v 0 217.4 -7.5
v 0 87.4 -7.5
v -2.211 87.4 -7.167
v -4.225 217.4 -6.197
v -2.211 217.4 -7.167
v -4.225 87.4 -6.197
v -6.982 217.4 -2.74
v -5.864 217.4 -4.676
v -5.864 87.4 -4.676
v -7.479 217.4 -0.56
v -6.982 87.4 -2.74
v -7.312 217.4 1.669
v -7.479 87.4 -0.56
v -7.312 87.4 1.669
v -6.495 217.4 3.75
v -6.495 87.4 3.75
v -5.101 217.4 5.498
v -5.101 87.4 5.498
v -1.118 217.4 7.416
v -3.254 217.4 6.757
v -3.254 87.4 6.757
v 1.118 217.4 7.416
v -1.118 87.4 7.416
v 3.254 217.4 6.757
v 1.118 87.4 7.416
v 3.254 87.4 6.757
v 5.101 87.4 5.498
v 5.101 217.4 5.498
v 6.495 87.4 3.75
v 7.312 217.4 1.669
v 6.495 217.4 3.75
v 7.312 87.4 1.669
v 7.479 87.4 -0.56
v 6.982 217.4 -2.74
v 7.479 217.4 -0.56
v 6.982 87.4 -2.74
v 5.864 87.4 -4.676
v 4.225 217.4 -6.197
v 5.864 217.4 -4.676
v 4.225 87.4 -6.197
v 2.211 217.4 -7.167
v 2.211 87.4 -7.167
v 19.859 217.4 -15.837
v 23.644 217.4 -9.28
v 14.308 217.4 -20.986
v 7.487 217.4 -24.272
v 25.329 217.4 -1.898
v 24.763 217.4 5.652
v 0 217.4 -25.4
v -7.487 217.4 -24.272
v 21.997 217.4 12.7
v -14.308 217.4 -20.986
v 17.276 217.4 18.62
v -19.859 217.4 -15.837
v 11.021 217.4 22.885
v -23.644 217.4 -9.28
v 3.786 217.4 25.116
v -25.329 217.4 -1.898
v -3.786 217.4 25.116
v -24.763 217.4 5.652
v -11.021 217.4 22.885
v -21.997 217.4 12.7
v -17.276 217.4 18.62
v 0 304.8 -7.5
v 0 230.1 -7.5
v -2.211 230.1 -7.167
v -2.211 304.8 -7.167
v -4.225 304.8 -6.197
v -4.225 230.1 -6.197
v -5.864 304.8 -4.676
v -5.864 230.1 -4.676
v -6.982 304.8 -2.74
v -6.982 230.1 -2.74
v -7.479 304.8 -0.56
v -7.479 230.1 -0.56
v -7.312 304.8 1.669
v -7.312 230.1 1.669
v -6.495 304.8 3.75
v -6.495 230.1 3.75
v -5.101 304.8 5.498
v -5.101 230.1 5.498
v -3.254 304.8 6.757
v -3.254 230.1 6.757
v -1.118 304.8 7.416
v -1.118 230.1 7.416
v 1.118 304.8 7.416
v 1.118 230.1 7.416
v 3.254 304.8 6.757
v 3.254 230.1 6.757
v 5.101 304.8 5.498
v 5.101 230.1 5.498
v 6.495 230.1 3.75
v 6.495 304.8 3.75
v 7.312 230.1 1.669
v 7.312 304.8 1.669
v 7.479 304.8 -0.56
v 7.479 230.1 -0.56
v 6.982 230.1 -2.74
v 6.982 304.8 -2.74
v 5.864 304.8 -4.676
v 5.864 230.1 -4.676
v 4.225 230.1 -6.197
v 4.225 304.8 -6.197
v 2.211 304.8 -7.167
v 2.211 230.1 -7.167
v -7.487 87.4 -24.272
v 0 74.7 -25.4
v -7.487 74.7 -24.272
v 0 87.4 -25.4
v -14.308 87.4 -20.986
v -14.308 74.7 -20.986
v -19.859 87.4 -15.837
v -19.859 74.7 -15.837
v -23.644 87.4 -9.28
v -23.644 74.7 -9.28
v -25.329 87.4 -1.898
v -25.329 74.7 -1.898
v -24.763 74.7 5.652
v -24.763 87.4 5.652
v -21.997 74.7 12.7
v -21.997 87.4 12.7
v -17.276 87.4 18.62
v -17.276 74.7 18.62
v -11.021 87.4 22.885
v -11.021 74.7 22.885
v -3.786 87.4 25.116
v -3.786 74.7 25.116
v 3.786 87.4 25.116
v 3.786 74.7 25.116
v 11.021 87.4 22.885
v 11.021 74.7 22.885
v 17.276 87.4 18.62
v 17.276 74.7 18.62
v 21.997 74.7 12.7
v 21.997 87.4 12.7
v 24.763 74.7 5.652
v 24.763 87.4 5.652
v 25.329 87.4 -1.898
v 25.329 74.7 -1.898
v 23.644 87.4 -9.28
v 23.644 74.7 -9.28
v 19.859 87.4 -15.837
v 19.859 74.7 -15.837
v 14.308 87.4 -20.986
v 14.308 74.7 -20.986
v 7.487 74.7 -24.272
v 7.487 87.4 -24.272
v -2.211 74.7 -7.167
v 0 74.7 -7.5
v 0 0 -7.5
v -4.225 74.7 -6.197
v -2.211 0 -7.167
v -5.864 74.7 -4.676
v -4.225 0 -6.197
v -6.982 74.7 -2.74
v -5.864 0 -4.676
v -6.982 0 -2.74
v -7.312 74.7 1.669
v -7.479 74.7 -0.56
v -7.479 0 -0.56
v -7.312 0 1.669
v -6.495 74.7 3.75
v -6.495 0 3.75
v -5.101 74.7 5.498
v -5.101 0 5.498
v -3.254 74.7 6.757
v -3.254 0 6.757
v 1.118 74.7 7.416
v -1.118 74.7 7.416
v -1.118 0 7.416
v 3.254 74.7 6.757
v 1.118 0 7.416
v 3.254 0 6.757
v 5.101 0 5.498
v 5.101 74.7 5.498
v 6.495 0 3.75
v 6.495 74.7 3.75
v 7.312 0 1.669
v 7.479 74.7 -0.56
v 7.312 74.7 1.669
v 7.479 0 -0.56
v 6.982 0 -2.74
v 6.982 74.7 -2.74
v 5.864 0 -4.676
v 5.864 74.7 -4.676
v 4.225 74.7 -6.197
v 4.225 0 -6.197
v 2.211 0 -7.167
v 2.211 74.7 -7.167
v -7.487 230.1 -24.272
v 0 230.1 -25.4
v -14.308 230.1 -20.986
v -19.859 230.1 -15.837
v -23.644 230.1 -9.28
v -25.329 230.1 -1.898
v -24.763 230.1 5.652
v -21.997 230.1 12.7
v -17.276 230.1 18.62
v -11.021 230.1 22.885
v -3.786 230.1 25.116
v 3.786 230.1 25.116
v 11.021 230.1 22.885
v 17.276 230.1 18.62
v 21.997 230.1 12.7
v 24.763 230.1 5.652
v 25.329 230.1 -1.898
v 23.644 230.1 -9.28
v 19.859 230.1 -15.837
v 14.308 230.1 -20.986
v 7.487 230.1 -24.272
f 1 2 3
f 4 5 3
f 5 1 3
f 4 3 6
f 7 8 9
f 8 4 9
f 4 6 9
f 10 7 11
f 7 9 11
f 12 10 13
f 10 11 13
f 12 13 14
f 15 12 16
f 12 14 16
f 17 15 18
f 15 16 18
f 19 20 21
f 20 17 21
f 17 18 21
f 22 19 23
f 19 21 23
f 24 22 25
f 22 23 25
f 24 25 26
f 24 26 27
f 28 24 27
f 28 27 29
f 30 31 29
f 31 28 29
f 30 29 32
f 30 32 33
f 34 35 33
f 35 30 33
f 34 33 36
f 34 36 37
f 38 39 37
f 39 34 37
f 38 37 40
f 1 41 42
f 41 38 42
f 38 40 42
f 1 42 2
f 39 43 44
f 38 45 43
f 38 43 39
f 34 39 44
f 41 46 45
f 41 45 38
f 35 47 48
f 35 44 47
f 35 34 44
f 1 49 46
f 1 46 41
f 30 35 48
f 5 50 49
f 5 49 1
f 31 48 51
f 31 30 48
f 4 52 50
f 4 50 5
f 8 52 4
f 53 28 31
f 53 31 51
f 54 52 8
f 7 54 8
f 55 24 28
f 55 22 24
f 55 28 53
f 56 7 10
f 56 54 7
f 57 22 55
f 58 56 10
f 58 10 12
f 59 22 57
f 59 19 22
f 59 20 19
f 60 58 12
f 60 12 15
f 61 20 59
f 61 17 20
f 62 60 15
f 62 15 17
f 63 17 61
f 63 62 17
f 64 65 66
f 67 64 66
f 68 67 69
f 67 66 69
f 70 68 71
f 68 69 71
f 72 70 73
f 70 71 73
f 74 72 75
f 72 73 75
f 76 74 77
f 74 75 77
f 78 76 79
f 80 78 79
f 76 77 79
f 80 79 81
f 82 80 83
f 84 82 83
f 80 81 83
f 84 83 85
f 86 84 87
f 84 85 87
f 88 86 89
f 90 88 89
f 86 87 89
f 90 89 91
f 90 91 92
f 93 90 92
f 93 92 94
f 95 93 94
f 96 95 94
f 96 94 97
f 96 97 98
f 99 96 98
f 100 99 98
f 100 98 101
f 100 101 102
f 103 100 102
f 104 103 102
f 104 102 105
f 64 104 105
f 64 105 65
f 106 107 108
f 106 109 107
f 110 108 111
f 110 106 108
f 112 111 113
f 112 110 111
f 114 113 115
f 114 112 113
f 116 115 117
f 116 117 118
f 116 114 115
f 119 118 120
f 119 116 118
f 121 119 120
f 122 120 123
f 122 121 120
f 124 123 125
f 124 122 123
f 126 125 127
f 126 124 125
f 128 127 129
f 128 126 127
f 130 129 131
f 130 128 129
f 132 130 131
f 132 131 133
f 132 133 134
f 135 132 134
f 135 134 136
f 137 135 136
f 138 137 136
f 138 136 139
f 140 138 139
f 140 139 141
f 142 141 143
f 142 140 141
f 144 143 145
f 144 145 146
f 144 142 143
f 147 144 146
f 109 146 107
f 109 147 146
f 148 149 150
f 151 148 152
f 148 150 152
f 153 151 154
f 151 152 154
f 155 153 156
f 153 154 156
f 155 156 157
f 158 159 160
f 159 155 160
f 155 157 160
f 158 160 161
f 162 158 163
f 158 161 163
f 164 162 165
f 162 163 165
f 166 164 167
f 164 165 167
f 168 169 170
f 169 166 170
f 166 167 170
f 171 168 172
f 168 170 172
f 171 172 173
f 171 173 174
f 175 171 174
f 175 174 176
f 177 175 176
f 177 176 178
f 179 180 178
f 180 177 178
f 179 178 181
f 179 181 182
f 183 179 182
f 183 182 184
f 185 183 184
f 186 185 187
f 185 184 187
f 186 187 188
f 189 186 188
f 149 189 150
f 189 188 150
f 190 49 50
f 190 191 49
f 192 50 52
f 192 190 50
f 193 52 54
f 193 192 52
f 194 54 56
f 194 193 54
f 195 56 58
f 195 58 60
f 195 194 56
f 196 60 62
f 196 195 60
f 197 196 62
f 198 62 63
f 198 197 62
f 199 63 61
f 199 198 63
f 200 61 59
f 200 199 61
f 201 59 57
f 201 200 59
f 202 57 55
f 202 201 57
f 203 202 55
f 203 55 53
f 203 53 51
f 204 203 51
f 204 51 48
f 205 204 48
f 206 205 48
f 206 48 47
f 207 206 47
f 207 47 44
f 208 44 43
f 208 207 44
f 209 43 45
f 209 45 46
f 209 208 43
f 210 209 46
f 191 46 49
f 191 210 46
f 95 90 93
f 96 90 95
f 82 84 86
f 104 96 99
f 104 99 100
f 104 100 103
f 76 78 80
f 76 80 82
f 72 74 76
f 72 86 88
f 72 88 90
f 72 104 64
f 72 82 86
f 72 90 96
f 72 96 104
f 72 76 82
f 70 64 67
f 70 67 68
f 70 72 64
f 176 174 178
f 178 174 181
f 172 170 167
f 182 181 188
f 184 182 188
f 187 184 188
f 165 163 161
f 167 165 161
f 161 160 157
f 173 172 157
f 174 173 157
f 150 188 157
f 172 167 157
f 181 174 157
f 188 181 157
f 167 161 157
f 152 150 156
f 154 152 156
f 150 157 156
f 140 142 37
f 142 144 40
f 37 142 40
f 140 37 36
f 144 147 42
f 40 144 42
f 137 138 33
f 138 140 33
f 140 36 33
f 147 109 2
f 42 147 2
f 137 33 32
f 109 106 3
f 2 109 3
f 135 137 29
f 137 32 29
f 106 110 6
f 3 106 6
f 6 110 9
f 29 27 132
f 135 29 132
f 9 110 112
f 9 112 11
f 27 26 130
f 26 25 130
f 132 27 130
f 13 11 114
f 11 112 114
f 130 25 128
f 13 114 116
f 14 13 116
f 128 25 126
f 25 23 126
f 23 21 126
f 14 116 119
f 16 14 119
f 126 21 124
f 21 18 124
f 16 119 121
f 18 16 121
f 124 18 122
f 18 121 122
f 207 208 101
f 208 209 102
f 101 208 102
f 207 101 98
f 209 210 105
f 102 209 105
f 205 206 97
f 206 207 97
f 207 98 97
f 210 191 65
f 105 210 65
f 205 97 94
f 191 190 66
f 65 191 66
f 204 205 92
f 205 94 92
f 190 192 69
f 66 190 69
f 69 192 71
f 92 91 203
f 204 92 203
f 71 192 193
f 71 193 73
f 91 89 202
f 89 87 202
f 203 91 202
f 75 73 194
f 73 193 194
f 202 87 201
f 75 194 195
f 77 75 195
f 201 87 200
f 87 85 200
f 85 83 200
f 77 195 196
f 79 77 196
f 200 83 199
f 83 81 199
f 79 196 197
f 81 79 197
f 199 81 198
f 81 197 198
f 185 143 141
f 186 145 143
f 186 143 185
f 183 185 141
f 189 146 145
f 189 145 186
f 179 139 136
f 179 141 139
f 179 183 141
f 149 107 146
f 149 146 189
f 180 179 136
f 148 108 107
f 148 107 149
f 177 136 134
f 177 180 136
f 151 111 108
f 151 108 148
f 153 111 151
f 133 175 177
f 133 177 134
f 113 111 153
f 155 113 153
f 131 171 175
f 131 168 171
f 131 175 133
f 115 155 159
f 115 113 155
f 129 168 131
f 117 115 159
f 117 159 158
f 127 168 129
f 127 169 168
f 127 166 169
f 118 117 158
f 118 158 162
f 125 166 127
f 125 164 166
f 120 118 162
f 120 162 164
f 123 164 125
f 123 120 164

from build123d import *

# Parameters (mm, degrees)
SKETCH1_R           = 7.5
BOSS_EXTRUDE1_DEPTH = 304.8
SKETCH2_W           = 25.4
SKETCH2_H           = 12.7


with BuildPart() as part:
    # Sketch1 → Boss-Extrude1 (new body)
    with BuildSketch(Plane(origin=(0, 0, 0), x_dir=(1, 0, 0), z_dir=(0, 1, 0))):
        with Locations(Location((0, 0, 0), (0, 0, 90))):
            Circle(SKETCH1_R)
    extrude(amount=BOSS_EXTRUDE1_DEPTH)

    # Sketch2 → Revolve1 (revolve)
    with BuildSketch(Plane.XY, mode=Mode.PRIVATE) as revolve1_sk:
        with Locations((12.7, 223.75)):
            Rectangle(SKETCH2_W, SKETCH2_H)
        with Locations((12.7, 81.05)):
            Rectangle(SKETCH2_W, SKETCH2_H)
    revolve(revolve1_sk.sketch.rotate(Axis((0, 217.4, 0), (0, 1, 0)), 90), axis=Axis((0, 217.4, 0), (0, 1, 0)))


solid = part.part
